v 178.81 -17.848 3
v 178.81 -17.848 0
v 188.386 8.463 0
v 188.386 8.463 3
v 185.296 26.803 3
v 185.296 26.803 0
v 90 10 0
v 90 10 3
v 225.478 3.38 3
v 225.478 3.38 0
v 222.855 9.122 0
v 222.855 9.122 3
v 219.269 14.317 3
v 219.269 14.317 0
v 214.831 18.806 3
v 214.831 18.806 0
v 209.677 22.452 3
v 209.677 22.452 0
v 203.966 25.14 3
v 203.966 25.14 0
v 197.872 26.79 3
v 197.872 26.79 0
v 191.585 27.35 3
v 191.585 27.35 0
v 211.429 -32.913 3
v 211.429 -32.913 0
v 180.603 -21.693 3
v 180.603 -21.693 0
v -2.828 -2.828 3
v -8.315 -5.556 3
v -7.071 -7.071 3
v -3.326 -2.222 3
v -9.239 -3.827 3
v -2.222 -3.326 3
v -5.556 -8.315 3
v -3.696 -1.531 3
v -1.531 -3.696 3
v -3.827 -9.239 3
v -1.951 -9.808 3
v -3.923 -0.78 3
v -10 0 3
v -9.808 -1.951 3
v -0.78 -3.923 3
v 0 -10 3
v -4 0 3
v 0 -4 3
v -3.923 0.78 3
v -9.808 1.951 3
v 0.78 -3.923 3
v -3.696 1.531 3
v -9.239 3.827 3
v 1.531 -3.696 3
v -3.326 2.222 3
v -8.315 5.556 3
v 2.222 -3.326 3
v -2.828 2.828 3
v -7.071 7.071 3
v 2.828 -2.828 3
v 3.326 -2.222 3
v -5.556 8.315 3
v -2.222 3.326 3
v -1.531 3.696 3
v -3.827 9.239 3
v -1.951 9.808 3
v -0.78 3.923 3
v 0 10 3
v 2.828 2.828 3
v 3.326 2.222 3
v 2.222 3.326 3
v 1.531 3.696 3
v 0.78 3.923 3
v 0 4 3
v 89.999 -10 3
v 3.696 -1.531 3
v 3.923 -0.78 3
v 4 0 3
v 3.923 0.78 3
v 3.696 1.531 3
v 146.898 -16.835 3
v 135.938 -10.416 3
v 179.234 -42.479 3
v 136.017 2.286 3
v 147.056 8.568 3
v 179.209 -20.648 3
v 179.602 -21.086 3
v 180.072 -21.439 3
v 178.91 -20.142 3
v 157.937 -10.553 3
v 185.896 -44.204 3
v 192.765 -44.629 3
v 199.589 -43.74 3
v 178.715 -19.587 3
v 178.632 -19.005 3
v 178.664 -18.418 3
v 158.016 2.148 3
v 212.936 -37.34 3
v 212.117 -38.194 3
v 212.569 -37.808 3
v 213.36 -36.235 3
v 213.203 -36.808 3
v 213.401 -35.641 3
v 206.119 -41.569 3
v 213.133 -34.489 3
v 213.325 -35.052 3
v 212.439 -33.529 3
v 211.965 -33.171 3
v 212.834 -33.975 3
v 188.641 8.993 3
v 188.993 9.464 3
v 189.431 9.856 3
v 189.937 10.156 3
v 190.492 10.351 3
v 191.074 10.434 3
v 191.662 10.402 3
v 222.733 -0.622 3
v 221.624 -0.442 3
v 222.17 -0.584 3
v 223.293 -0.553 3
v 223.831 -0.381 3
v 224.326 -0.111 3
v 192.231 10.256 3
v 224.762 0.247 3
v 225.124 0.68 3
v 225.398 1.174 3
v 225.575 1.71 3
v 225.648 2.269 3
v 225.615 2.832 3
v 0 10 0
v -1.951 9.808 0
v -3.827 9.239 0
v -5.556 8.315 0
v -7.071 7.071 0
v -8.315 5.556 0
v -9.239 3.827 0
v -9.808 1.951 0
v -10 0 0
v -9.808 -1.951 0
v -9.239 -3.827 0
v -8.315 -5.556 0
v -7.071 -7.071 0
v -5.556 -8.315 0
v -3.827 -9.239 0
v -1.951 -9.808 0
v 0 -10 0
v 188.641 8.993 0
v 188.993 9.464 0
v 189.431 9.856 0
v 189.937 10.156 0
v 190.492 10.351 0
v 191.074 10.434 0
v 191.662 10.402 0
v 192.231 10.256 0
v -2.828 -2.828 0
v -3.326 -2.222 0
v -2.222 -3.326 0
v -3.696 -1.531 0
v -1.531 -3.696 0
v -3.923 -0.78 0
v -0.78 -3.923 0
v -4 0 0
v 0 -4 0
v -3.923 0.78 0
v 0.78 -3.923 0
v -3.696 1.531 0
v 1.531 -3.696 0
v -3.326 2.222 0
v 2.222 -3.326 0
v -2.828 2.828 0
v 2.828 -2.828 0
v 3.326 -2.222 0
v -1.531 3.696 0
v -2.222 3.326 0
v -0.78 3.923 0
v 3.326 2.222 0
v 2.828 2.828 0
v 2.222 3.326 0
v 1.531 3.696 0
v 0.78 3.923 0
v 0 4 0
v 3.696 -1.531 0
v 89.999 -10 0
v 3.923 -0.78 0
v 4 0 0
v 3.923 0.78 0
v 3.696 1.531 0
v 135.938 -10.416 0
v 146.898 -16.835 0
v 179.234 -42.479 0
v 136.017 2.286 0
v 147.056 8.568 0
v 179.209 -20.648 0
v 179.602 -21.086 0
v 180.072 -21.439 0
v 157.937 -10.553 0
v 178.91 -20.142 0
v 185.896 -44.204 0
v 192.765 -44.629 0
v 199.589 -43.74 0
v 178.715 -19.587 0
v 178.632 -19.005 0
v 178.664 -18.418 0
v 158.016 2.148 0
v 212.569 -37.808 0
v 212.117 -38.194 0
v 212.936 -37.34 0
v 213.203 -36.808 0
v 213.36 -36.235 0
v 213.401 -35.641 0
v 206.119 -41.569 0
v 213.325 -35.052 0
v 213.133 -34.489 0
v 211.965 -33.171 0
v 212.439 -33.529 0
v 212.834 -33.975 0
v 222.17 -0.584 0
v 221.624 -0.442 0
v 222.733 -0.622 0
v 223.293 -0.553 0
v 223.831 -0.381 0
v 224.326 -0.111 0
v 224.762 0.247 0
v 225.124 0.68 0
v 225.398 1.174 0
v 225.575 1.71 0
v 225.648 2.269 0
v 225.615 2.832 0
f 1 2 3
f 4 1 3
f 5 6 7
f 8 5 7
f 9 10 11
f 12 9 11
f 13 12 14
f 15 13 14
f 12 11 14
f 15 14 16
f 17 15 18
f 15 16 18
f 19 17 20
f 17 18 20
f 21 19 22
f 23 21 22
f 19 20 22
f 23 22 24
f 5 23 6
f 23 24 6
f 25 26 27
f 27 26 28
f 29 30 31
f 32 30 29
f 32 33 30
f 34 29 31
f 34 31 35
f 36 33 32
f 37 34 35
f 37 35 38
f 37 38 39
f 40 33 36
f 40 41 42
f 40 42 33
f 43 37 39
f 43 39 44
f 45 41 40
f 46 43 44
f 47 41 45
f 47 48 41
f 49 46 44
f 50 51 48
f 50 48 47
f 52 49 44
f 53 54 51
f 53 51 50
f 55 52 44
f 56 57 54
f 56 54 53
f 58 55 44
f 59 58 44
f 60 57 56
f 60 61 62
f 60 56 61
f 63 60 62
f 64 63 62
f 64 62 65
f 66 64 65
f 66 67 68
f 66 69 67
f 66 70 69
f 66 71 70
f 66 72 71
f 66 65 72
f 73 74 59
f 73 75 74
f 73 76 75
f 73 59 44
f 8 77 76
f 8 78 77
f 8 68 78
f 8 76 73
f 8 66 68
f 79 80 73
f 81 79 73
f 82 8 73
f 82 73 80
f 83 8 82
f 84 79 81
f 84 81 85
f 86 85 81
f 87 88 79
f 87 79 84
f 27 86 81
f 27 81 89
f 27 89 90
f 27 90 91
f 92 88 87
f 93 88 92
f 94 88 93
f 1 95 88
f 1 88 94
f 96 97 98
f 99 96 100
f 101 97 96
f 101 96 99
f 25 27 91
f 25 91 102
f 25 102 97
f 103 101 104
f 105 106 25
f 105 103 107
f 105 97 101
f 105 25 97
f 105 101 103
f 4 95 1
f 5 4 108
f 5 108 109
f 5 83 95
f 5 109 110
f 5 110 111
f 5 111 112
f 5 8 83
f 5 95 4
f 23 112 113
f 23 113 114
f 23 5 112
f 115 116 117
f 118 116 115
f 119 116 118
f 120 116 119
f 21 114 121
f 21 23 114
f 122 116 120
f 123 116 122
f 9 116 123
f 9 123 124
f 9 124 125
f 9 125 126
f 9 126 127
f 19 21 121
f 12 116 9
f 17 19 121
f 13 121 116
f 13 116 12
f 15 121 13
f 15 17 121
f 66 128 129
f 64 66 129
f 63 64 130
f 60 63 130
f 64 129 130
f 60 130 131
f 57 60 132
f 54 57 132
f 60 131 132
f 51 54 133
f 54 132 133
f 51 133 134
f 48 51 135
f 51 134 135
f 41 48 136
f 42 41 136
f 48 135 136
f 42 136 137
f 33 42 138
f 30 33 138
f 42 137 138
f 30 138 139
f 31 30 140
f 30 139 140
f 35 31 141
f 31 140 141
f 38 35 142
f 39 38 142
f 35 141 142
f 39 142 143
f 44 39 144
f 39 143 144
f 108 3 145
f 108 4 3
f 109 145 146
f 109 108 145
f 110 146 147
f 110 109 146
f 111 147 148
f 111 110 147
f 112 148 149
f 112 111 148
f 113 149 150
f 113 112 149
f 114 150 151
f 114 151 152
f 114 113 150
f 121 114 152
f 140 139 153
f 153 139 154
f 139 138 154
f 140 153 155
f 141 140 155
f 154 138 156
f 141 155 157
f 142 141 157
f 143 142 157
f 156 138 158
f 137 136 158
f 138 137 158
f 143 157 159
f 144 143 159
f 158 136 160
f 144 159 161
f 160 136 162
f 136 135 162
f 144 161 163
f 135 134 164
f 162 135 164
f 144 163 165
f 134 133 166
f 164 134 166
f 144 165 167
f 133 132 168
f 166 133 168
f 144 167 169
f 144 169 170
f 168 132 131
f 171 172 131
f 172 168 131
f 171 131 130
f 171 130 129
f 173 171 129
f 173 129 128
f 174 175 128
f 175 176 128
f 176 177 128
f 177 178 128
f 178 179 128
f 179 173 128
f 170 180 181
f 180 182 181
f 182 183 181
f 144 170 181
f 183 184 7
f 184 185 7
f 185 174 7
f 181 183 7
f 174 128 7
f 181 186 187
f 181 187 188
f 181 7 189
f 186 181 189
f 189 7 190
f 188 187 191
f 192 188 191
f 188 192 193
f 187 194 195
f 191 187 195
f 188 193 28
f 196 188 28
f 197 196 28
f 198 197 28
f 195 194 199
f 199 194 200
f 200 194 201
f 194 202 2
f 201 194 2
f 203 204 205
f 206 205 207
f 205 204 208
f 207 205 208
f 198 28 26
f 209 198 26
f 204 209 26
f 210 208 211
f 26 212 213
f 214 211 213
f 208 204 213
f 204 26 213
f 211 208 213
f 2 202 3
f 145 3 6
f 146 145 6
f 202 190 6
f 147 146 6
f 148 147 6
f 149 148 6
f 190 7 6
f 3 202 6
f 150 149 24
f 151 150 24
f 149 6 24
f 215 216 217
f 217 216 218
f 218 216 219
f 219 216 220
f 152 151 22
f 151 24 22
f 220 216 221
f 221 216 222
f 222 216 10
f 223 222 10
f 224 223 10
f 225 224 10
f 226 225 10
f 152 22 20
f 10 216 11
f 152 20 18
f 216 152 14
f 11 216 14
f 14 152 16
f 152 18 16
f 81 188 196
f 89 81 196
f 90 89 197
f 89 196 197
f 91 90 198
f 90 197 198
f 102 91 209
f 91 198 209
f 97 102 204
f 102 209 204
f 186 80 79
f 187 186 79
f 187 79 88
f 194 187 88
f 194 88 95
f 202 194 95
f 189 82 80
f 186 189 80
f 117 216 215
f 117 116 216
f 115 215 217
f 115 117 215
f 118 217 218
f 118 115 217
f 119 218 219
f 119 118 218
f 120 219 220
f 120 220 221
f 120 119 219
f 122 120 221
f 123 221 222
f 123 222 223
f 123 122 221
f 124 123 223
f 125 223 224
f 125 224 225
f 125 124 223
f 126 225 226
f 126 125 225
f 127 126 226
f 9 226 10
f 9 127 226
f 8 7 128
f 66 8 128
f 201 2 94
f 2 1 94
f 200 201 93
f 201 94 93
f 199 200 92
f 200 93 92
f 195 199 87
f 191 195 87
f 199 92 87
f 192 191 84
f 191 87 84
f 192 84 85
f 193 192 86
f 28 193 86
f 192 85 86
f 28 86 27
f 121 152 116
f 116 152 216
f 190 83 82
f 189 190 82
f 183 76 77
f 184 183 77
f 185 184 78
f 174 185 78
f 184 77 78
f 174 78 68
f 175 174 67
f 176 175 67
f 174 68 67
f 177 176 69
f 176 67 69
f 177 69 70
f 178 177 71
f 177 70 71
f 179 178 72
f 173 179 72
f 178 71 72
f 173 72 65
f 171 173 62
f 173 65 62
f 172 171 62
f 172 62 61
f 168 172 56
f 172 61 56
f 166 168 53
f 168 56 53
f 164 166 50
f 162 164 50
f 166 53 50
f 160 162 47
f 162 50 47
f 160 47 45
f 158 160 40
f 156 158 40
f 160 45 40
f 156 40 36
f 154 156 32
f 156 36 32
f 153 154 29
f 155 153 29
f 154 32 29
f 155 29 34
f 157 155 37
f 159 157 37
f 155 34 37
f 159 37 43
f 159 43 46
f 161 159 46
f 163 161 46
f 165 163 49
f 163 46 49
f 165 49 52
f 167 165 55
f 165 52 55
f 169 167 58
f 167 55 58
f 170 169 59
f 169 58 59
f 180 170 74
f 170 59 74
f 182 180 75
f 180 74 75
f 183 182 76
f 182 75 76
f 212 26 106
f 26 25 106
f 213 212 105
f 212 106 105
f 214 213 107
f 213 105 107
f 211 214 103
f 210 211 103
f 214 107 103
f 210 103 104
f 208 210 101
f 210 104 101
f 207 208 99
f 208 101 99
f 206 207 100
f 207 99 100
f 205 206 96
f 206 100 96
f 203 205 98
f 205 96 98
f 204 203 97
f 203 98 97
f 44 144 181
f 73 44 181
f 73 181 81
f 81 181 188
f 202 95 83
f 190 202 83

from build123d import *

# Parameters (mm, degrees)
BOSS_EXTRUDE1_DEPTH = 3
SKETCH4_R           = 4
CUT_EXTRUDE1_DEPTH  = 3
FILLET1_R           = 3
FILLET2_R           = 3
FILLET4_R           = 3
FILLET5_R           = 3


with BuildPart() as part:
    # Sketch3 → Boss-Extrude1 (new body)
    with BuildSketch(Plane.XY):
        with BuildLine():
            Line((90, 10), (0, 10))
            ThreePointArc((0, 10), (-10, 0), (0, -10))
            Line((0, -10), (89.999342556, -10))
            Line((89.999342556, -10), (179.234195732, -42.478830415))
            ThreePointArc((179.234195732, -42.478830415), (198.912530475, -43.888338079), (216.37877505, -34.714796202))
            Line((216.37877505, -34.714796202), (177.783610295, -20.667305045))
            Line((177.783610295, -20.667305045), (189.412295169, 11.282244062))
            Line((189.412295169, 11.282244062), (227, -2.398561671))
            ThreePointArc((227, -2.398561671), (212.1956726, 20.839577528), (185.295586496, 26.803183042))
            Line((185.295586496, 26.803183042), (90, 10))
        make_face()
    extrude(amount=BOSS_EXTRUDE1_DEPTH)

    # Sketch4 → Cut-Extrude1 (cut)
    with BuildSketch(Plane.XY.offset(3)):
        Circle(SKETCH4_R)
        Polygon((157.937239429, -10.553104382), (158.016476937, 2.148354383), (147.056309736, 8.56770546), (136.016905026, 2.285597773), (135.937667518, -10.415860992), (146.897834719, -16.835212069), align=None)
    extrude(amount=-CUT_EXTRUDE1_DEPTH, mode=Mode.SUBTRACT)

    # Fillet1
    fillet1_edges = [part.edges().sort_by_distance(p)[0] for p in [
        (177.783610295, -20.667305045, 1.5),
    ]]
    fillet(fillet1_edges, radius=FILLET1_R)

    # Fillet2
    fillet2_edges = [part.edges().sort_by_distance(p)[0] for p in [
        (189.412295169, 11.282244062, 1.5),
    ]]
    fillet(fillet2_edges, radius=FILLET2_R)

    # Fillet4
    fillet4_edges = [part.edges().sort_by_distance(p)[0] for p in [
        (227, -2.398561671, 1.5),
    ]]
    fillet(fillet4_edges, radius=FILLET4_R)

    # Fillet5
    fillet5_edges = [part.edges().sort_by_distance(p)[0] for p in [
        (216.37877505, -34.714796202, 1.5),
    ]]
    fillet(fillet5_edges, radius=FILLET5_R)


solid = part.part
